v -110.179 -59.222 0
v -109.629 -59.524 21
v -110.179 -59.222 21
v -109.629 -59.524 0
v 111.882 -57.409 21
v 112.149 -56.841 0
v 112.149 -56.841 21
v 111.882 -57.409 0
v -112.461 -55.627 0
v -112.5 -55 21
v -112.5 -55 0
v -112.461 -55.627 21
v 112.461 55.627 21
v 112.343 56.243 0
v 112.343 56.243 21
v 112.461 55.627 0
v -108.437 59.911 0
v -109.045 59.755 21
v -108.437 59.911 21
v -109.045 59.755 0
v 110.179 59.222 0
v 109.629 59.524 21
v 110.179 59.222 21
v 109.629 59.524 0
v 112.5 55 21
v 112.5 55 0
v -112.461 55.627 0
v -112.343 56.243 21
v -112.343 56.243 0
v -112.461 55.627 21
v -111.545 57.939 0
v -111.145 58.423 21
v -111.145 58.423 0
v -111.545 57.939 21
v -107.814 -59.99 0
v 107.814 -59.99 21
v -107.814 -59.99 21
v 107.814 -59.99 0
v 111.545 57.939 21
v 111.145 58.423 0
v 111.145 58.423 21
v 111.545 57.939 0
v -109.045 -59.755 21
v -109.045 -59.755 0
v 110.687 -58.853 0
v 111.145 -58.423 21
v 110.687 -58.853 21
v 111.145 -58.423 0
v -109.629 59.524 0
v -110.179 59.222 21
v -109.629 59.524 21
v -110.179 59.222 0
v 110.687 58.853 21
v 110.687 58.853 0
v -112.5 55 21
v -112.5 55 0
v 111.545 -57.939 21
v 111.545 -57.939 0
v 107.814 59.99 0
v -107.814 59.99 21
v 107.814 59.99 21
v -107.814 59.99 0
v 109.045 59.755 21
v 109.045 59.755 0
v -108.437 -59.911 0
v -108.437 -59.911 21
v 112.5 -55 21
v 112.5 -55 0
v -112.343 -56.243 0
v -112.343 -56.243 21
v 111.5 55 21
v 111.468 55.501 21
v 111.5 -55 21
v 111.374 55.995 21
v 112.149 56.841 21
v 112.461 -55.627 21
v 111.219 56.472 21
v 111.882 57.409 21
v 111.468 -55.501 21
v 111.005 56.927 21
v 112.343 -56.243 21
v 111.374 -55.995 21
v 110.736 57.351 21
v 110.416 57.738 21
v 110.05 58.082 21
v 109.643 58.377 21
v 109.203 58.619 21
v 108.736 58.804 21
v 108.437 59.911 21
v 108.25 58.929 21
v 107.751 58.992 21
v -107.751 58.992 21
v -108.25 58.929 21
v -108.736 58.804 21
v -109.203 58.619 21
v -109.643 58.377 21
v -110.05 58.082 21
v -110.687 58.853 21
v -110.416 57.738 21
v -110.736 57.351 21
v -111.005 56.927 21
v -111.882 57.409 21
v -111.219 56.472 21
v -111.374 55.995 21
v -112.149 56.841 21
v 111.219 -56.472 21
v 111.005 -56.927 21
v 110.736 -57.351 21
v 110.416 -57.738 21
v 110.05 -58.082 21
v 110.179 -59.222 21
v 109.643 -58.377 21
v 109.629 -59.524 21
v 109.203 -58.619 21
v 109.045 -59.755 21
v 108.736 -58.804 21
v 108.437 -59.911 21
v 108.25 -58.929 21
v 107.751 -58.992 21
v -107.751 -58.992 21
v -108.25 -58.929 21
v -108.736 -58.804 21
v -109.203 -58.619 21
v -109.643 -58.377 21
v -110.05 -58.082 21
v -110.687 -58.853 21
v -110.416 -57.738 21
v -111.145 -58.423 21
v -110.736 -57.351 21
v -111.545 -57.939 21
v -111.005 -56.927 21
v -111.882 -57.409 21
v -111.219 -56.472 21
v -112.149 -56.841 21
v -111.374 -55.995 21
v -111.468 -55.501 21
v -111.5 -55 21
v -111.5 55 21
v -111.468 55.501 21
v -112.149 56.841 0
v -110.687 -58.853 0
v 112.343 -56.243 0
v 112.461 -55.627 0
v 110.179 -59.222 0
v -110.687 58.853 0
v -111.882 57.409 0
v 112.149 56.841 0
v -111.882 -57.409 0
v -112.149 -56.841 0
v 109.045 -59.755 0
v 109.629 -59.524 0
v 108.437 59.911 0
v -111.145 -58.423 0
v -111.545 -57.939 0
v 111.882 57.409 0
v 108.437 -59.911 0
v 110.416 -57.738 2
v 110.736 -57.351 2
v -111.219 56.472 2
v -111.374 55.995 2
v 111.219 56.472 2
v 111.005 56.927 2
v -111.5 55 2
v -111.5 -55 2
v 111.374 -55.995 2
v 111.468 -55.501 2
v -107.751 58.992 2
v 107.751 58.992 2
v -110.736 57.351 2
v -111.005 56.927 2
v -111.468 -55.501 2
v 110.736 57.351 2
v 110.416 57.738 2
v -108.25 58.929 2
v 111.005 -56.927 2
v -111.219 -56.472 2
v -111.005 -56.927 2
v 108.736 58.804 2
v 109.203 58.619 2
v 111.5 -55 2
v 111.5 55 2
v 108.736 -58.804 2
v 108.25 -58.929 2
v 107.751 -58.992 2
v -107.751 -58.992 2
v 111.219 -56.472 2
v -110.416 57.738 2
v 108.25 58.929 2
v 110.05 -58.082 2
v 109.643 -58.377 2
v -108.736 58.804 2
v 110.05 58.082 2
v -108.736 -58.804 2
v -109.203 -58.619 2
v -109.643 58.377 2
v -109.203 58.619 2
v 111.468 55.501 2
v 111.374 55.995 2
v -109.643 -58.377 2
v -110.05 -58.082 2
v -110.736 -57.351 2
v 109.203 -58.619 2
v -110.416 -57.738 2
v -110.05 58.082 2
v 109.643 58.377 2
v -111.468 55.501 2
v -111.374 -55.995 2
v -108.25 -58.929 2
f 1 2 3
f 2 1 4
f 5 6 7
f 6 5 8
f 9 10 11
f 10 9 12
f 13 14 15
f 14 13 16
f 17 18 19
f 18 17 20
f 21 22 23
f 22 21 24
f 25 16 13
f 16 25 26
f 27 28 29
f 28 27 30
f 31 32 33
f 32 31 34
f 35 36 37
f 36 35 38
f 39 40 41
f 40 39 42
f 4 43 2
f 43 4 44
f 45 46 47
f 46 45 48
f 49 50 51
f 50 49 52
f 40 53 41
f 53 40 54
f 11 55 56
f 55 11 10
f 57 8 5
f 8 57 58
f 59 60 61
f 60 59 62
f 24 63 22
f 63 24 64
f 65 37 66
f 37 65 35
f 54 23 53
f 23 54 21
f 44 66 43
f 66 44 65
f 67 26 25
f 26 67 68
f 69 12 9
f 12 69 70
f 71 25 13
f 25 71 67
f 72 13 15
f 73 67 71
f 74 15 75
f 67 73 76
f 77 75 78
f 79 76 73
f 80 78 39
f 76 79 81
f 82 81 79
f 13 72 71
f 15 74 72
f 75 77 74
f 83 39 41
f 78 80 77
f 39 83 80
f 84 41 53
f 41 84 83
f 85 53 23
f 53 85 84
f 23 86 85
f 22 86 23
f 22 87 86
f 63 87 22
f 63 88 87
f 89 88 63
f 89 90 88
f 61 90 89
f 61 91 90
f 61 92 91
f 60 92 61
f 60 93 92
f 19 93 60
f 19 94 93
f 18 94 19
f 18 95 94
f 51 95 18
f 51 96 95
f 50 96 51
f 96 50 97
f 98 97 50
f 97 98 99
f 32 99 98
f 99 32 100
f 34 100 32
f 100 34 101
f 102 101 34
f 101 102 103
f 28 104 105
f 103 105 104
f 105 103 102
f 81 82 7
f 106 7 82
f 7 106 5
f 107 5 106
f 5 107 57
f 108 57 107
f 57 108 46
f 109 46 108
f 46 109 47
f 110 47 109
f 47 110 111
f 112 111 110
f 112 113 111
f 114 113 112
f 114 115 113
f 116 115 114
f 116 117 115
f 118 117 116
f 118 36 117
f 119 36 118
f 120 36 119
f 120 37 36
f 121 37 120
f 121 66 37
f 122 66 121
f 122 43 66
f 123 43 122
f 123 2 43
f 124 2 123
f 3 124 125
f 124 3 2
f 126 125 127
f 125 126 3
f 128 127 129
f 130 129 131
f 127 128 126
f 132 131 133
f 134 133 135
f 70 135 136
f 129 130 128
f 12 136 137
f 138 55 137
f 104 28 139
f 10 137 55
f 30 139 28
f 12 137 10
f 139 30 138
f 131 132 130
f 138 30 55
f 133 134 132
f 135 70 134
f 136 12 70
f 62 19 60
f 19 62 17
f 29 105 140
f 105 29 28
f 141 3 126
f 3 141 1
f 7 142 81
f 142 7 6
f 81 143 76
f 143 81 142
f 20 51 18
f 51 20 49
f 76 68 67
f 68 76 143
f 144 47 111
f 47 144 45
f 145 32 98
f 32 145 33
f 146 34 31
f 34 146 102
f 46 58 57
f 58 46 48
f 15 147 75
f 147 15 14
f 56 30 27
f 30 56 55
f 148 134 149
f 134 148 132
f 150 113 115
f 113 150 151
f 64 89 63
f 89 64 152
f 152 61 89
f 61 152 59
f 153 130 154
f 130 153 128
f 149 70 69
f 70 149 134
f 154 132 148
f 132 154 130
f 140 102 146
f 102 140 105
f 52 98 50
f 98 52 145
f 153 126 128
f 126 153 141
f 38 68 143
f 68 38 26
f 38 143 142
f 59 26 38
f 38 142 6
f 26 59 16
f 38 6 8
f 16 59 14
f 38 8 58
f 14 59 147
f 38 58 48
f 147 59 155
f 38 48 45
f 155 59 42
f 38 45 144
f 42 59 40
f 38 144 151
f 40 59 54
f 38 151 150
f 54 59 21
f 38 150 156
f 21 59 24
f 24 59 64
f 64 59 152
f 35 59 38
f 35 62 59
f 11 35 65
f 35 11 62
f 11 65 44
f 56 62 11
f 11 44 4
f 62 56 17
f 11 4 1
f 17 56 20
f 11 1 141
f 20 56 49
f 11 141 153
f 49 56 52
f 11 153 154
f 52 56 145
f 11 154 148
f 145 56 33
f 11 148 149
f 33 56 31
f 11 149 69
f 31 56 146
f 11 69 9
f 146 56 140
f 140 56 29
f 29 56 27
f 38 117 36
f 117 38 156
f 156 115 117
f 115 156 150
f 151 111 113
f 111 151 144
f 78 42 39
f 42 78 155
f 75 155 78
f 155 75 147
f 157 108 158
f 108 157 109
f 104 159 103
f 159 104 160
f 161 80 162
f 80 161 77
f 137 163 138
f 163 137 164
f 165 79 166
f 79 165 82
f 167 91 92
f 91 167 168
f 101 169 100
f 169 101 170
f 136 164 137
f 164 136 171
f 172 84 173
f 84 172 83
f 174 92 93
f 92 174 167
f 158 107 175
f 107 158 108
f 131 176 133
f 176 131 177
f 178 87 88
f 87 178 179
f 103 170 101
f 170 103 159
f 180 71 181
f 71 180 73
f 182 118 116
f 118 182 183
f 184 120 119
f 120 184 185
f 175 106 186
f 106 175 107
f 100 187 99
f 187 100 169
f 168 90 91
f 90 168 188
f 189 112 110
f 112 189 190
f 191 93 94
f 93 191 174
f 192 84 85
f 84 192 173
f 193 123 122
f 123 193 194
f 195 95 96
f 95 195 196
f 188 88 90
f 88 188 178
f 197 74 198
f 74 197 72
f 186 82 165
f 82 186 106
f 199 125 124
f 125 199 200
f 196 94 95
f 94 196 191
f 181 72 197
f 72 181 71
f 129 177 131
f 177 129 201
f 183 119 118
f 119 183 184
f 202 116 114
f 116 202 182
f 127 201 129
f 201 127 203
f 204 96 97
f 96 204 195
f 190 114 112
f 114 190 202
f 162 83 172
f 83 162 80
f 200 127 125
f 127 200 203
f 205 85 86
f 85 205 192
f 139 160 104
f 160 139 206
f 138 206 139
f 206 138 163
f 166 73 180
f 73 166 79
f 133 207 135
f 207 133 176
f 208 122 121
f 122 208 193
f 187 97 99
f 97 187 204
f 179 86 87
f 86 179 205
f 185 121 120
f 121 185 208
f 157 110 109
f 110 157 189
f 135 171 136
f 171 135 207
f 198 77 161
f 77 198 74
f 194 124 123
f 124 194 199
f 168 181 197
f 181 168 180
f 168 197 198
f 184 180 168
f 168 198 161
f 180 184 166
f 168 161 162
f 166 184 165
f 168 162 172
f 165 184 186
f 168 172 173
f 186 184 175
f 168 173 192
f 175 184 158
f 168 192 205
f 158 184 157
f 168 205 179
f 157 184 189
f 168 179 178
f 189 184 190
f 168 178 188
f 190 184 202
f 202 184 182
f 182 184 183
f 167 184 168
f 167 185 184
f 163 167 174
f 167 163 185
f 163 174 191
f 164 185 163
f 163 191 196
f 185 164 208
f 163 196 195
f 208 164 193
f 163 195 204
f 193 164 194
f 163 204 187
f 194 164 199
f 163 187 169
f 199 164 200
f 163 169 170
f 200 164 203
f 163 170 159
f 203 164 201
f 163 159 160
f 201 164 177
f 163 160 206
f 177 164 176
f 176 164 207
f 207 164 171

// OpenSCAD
$fn = 50;


difference() {
	union() {
		hull() {
			translate(v = [-107.5000000000, 55.0000000000, 0]) {
				cylinder(h = 21, r = 5);
			}
			translate(v = [107.5000000000, 55.0000000000, 0]) {
				cylinder(h = 21, r = 5);
			}
			translate(v = [-107.5000000000, -55.0000000000, 0]) {
				cylinder(h = 21, r = 5);
			}
			translate(v = [107.5000000000, -55.0000000000, 0]) {
				cylinder(h = 21, r = 5);
			}
		}
	}
	union() {
		translate(v = [0, 0, 2]) {
			hull() {
				translate(v = [-107.5000000000, 55.0000000000, 0]) {
					cylinder(h = 19, r = 4);
				}
				translate(v = [107.5000000000, 55.0000000000, 0]) {
					cylinder(h = 19, r = 4);
				}
				translate(v = [-107.5000000000, -55.0000000000, 0]) {
					cylinder(h = 19, r = 4);
				}
				translate(v = [107.5000000000, -55.0000000000, 0]) {
					cylinder(h = 19, r = 4);
				}
			}
		}
	}
}
